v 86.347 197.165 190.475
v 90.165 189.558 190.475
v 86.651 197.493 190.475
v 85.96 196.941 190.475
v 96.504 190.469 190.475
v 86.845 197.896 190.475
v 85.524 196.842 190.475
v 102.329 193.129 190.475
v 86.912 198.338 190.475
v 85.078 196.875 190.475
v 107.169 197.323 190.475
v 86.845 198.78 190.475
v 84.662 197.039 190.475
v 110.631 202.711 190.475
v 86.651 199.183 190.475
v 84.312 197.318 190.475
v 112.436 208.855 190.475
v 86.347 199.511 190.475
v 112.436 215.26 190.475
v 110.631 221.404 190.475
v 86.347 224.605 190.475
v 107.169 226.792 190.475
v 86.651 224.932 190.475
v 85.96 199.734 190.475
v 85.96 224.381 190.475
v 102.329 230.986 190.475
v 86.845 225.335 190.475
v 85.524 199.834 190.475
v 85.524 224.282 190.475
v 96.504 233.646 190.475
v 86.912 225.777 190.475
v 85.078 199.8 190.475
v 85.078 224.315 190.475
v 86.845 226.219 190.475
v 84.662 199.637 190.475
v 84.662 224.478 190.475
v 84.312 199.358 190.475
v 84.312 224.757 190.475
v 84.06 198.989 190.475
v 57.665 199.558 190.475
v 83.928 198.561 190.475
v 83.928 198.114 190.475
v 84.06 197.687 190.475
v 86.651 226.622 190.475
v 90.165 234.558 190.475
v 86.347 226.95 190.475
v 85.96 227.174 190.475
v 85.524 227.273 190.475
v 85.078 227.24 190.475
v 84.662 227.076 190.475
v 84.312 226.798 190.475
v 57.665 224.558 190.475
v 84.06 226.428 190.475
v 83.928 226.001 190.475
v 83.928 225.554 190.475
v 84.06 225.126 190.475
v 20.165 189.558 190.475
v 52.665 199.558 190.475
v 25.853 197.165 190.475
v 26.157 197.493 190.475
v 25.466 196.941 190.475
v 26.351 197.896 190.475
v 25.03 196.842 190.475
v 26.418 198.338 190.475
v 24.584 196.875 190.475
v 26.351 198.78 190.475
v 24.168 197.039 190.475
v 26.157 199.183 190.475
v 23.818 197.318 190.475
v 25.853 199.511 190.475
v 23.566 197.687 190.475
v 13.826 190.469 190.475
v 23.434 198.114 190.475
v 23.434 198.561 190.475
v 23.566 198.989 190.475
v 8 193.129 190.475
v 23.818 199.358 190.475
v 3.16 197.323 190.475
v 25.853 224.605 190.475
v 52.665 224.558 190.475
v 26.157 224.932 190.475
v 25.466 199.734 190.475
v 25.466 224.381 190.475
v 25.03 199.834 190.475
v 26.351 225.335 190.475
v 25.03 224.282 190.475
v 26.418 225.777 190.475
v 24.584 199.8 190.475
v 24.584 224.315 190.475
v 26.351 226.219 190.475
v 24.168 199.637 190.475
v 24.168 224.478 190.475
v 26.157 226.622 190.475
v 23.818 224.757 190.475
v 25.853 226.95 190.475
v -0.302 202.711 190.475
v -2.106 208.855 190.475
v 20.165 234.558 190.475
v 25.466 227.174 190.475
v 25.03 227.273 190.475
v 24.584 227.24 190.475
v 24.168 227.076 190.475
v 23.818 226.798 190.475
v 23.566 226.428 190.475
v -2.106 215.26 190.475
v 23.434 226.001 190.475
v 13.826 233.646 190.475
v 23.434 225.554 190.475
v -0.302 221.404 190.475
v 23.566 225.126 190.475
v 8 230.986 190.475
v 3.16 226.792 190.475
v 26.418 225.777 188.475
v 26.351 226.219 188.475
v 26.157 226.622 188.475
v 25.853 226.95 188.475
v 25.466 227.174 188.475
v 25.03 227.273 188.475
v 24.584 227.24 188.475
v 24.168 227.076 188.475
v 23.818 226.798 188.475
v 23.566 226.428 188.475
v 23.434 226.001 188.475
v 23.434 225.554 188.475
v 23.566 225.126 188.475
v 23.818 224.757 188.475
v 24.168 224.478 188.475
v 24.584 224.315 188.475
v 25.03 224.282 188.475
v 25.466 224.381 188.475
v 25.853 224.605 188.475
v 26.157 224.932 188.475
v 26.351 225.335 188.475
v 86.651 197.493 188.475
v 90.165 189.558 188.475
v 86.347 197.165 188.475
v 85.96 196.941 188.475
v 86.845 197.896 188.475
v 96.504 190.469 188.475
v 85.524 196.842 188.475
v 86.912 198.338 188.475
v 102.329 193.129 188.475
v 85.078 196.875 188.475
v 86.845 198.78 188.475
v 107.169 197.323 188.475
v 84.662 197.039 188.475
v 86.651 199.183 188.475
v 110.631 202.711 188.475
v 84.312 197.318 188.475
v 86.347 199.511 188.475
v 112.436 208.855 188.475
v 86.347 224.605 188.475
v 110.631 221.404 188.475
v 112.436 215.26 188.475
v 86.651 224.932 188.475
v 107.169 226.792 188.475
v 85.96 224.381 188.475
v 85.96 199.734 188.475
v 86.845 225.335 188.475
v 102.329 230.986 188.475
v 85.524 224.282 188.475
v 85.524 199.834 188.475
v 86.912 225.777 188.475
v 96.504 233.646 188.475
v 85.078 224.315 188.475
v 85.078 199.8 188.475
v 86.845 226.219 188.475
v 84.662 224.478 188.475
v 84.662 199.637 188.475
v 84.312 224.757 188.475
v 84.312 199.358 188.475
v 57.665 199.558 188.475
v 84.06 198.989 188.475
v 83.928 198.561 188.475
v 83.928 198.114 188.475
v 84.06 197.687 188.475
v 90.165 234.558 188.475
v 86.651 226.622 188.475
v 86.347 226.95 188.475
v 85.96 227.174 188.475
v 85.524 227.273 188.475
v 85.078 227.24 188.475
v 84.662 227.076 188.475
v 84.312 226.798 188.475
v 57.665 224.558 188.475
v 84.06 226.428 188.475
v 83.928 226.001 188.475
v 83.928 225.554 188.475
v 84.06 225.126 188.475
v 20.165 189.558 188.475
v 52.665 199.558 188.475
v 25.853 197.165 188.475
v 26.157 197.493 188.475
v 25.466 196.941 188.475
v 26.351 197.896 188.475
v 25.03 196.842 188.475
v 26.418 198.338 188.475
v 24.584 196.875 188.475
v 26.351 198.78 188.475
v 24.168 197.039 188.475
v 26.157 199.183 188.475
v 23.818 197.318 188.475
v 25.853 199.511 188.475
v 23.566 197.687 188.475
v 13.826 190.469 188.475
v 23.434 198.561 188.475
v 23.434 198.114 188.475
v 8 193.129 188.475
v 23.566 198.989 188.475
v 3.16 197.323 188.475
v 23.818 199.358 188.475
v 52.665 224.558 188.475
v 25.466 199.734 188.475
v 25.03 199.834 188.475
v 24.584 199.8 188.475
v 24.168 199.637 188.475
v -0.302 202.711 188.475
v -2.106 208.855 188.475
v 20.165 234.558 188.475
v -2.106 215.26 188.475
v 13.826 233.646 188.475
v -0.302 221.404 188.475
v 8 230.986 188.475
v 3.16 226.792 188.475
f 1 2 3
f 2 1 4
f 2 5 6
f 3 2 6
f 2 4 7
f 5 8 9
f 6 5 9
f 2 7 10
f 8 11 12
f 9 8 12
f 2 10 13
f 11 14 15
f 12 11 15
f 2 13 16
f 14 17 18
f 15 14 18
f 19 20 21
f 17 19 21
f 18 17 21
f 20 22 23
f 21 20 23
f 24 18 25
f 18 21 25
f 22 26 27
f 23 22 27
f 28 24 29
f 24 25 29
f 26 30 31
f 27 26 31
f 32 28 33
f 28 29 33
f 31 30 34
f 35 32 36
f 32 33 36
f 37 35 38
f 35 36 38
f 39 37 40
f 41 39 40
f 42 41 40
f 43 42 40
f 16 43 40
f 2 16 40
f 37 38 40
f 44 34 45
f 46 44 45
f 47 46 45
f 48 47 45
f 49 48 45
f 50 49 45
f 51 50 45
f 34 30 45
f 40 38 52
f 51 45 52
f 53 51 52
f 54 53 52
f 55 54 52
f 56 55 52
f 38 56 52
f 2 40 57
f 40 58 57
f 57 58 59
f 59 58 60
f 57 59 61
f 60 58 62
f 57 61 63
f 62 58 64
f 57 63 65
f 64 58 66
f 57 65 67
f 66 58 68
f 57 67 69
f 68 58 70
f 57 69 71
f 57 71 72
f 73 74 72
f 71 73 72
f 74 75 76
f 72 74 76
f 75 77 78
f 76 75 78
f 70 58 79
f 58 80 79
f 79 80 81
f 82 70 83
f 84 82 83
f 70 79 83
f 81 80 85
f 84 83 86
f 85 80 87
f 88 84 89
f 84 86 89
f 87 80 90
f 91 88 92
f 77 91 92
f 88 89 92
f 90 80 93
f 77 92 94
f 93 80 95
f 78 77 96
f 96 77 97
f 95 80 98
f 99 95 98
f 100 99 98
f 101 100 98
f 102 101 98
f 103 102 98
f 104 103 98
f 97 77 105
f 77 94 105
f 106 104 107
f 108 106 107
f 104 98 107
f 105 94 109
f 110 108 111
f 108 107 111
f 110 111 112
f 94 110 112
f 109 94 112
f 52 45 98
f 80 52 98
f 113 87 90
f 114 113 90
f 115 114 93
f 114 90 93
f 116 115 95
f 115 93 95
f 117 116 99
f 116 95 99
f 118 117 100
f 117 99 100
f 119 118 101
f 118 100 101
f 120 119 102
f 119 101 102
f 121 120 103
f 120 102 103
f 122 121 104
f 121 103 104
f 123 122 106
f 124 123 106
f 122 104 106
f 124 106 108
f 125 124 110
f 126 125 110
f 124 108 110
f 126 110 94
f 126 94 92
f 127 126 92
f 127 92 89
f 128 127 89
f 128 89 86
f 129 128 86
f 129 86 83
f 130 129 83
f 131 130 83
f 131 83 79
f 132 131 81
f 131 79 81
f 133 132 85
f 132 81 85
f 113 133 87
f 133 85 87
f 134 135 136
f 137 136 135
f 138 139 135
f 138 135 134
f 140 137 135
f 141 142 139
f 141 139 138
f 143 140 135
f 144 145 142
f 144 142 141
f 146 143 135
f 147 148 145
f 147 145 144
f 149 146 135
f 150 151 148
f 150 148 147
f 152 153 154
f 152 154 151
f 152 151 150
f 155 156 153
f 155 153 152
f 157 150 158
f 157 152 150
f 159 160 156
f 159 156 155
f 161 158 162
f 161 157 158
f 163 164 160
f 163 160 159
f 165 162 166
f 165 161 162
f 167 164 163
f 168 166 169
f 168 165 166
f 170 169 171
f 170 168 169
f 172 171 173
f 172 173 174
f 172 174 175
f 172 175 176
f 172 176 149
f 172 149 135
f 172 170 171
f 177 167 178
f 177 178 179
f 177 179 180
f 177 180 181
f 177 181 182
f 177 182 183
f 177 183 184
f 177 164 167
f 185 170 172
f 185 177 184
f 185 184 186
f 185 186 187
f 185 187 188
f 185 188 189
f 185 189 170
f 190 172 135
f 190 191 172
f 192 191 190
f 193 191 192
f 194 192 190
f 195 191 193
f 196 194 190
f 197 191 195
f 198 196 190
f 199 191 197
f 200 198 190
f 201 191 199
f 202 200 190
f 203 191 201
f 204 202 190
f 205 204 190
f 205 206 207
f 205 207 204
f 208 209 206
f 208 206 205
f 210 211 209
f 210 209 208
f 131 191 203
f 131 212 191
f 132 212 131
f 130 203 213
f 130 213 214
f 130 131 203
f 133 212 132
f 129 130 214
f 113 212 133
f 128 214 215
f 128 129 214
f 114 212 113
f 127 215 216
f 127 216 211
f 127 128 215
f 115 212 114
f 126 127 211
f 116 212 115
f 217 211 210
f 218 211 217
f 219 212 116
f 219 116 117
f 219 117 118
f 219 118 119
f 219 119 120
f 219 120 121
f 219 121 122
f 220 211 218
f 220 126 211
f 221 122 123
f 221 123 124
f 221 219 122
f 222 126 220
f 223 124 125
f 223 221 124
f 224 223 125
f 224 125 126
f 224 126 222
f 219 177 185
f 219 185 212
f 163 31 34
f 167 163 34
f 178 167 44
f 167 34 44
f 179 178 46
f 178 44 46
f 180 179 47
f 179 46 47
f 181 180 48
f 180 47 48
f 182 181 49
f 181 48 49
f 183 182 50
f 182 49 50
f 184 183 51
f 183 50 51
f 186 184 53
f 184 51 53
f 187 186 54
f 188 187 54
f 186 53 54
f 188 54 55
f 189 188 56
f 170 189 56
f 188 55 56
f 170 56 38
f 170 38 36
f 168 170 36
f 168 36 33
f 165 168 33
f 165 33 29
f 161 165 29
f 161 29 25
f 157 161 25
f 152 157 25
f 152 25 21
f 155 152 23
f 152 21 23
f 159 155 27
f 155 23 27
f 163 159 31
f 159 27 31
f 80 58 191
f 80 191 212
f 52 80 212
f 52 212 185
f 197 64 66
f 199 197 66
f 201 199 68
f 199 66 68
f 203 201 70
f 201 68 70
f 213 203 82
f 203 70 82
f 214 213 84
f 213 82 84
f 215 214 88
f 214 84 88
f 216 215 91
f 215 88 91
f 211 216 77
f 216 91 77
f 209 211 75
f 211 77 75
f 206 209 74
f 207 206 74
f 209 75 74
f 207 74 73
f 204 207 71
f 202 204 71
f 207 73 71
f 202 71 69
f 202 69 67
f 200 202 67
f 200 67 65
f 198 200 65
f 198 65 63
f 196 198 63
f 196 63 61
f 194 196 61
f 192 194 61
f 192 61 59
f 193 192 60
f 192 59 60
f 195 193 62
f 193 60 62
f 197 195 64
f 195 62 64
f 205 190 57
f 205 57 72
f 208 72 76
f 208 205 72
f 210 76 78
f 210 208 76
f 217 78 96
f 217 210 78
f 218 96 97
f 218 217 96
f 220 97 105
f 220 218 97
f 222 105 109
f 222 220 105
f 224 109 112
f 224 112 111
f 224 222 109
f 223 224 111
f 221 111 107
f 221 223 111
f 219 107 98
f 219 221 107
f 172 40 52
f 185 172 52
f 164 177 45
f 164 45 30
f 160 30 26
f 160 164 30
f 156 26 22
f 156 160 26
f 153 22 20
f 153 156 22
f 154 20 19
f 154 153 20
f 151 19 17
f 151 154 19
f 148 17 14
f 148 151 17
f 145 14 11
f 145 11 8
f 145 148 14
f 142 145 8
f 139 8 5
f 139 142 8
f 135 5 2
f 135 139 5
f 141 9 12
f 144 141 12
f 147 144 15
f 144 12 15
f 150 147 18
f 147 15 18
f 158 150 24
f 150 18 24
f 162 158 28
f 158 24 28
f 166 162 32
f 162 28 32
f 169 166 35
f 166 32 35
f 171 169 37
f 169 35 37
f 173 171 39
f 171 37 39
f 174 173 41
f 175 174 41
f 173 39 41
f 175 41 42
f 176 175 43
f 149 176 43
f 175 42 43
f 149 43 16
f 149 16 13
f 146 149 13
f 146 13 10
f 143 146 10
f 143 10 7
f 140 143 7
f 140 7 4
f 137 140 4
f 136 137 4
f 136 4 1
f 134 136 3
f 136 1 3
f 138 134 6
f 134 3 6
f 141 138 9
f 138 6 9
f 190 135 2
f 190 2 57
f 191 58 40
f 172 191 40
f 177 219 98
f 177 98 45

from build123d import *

# Parameters (mm, degrees)
DODANIE_WYCI_GNI_CIE1_DEPTH = 2
SZKIC2_R                    = 1.5
WYTNIJ_WYCI_GNI_CIE1_DEPTH  = 2
SZKIC4_W                    = 5
SZKIC4_H                    = 25
WYTNIJ_WYCI_GNI_CIE2_DEPTH  = 10


with BuildPart() as part:
    # Szkic1 → Dodanie-wyciągnięcie1 (new body)
    with BuildSketch(Plane.XY.offset(188.475370577)):
        with BuildLine():
            Line((90.164601585, 189.557553235), (20.164601585, 189.557553235))
            ThreePointArc((20.164601585, 189.557553235), (-2.335398415, 212.057553235), (20.164601585, 234.557553235))
            Line((20.164601585, 234.557553235), (90.164601585, 234.557553235))
            ThreePointArc((90.164601585, 234.557553235), (112.664601585, 212.057553235), (90.164601585, 189.557553235))
        make_face()
    extrude(amount=DODANIE_WYCI_GNI_CIE1_DEPTH)

    # Szkic2 → Wytnij-wyciągnięcie1 (cut)
    with BuildSketch(Plane.XY.offset(190.475370577)):
        with Locations((85.411548148, 225.777306357)):
            Circle(SZKIC2_R)
        with Locations((24.917655023, 225.777306357)):
            Circle(SZKIC2_R)
        with Locations((24.917655023, 198.337800113)):
            Circle(SZKIC2_R)
        with Locations((85.411548148, 198.337800113)):
            Circle(SZKIC2_R)
    extrude(amount=-WYTNIJ_WYCI_GNI_CIE1_DEPTH, mode=Mode.SUBTRACT)

    # Szkic4 → Wytnij-wyciągnięcie2 (cut)
    with BuildSketch(Plane.XY.offset(190.475370577)):
        with Locations((55.164601585, 212.057553235)):
            Rectangle(SZKIC4_W, SZKIC4_H)
    extrude(amount=-WYTNIJ_WYCI_GNI_CIE2_DEPTH, mode=Mode.SUBTRACT)


solid = part.part
